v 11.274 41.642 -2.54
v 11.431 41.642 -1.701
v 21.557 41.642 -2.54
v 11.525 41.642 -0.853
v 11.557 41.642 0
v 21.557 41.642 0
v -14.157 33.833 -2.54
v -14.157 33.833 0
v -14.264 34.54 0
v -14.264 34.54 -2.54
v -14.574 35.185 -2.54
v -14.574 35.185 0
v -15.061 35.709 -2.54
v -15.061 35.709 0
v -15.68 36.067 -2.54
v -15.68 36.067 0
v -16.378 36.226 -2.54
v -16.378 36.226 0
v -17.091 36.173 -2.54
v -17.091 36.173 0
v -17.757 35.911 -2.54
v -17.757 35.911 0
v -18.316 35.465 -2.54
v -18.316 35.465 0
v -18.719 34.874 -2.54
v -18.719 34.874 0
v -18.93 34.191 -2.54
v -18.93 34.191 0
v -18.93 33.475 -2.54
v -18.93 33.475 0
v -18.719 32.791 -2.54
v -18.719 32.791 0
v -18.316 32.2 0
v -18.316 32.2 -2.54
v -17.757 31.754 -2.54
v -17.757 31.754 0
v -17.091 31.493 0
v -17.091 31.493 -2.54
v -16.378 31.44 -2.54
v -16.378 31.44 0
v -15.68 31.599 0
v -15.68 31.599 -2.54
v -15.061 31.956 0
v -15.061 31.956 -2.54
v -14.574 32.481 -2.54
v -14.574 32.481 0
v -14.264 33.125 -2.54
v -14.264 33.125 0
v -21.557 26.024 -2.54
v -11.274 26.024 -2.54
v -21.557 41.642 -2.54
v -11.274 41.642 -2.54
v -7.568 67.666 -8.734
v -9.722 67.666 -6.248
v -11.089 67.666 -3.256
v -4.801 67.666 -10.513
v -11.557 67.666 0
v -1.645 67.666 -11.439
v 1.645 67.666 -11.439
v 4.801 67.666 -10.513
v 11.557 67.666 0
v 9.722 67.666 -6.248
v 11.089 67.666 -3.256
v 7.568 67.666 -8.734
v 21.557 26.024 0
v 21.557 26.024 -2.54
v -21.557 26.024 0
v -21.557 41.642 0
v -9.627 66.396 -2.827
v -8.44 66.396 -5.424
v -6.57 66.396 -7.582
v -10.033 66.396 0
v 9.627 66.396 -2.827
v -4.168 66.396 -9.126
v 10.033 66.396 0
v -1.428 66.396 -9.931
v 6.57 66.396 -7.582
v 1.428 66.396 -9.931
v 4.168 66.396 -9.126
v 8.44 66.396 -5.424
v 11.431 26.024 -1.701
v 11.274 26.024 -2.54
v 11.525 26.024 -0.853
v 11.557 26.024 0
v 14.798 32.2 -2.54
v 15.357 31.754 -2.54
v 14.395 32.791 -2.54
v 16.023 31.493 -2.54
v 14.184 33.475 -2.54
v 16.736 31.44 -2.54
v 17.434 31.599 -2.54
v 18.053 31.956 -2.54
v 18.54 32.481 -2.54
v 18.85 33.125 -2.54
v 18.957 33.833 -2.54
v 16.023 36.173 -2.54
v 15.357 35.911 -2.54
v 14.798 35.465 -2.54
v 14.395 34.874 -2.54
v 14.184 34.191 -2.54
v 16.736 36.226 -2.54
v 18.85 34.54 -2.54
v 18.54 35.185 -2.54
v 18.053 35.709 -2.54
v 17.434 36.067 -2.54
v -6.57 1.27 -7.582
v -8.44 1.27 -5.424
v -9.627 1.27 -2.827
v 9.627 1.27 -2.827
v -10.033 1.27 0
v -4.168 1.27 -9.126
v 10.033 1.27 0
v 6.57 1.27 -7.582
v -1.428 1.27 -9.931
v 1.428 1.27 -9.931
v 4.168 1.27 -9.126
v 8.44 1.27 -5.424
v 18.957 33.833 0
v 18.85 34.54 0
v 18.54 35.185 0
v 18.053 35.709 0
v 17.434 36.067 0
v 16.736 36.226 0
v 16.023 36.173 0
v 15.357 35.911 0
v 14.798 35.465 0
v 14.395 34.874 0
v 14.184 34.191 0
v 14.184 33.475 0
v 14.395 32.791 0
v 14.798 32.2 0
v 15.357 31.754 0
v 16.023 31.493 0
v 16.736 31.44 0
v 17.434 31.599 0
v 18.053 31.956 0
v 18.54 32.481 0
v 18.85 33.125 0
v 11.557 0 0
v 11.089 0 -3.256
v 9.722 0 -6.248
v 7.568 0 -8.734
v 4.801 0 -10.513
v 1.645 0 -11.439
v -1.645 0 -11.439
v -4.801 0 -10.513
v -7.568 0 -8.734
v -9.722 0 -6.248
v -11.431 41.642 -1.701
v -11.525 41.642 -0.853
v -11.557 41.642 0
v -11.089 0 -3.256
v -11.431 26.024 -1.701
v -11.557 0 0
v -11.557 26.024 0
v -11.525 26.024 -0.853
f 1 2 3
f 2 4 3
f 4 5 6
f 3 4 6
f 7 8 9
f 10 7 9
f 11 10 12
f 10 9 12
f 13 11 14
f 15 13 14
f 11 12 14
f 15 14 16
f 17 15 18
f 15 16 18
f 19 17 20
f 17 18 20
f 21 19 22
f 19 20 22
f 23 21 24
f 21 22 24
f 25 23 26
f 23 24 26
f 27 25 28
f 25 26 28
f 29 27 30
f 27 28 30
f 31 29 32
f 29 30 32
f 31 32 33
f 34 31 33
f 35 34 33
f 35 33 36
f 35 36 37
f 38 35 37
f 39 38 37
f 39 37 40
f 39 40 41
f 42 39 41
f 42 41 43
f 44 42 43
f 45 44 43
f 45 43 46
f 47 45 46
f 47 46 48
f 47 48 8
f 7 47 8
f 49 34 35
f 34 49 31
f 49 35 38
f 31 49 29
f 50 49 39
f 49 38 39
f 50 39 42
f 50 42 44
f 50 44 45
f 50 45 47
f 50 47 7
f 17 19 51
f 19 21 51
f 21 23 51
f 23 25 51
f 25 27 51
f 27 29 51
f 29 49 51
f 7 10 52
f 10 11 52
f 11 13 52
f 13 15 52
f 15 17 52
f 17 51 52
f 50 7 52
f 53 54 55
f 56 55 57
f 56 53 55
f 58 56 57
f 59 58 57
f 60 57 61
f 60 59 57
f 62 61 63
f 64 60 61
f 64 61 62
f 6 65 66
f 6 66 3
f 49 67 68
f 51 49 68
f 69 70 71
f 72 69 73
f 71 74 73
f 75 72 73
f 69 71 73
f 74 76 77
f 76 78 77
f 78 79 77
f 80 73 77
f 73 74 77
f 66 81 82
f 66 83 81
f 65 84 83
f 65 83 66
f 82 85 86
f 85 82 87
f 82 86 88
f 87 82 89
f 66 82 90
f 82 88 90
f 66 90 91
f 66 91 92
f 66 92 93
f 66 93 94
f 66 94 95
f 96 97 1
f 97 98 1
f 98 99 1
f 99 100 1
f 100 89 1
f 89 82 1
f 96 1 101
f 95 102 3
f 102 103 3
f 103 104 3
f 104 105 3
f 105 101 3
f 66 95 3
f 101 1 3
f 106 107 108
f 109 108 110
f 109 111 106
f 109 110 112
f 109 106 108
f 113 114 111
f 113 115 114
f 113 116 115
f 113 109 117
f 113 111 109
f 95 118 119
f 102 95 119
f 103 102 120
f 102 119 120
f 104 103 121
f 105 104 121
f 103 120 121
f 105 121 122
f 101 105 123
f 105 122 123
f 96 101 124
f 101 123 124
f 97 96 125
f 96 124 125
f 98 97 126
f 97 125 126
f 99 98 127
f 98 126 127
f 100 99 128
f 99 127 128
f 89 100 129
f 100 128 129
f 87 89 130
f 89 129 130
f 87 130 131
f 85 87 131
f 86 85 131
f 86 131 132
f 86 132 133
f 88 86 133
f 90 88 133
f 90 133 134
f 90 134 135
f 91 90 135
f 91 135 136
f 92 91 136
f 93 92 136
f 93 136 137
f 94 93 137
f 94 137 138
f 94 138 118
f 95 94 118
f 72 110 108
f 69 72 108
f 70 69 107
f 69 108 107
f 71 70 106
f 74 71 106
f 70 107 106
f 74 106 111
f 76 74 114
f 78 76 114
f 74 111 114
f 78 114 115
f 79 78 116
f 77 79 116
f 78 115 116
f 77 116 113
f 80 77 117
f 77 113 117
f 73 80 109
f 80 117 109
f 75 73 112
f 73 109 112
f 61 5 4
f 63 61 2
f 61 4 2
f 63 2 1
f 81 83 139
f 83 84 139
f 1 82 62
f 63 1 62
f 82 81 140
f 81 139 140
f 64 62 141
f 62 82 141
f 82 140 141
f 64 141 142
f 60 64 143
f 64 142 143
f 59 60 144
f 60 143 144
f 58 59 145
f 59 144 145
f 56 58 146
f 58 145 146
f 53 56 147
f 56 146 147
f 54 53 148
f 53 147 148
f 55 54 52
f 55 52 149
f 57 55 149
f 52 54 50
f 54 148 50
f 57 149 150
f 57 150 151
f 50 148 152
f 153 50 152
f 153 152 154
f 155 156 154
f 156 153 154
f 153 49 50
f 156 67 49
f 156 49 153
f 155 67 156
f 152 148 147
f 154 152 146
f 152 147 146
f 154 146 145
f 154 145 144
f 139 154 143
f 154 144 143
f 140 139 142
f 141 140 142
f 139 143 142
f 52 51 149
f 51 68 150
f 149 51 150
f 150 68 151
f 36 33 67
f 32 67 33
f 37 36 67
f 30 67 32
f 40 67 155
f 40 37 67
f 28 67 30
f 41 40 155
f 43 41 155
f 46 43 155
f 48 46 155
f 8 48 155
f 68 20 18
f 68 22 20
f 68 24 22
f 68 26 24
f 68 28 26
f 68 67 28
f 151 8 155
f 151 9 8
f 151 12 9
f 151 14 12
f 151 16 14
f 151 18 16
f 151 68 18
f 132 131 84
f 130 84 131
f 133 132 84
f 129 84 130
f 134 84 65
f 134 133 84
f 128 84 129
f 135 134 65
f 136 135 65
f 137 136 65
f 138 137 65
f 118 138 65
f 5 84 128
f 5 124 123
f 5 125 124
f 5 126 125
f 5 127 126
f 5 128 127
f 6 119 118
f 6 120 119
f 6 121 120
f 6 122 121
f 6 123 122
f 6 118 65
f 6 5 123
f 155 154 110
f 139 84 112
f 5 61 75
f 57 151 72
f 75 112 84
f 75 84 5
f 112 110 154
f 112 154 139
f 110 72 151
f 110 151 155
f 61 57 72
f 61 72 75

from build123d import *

# Parameters (mm, degrees)
BOSS_EXTRUDE1_DEPTH  = 66.3956
BOSS_EXTRUDE2_DEPTH  = 1.27
SKETCH6_W            = 10
SKETCH6_H            = 15.618122384
SKETCH6_R            = 0.592132867
SKETCH6_W_2          = 1.524
BOSS_EXTRUDE4_DEPTH  = 2.54
M4_CLEARANCE_HOLE1_D = 4.8


with BuildPart() as part:
    # Sketch1 → Boss-Extrude1 (new body)
    with BuildSketch(Plane(origin=(0, 0, 0), x_dir=(1, 0, 0), z_dir=(0, 1, 0))):
        with BuildLine():
            Line((-11.557, 0), (-10.033, 0))
            ThreePointArc((-10.033, 0), (0, 10.033), (10.033, 0))
            Line((10.033, 0), (11.557, 0))
            ThreePointArc((11.557, 0), (0, 11.557), (-11.557, 0))
        make_face()
    extrude(amount=BOSS_EXTRUDE1_DEPTH)

    # Sketch2 → Boss-Extrude2 (add)
    with BuildSketch(Plane(origin=(0, 66.3956, 0), x_dir=(1, 0, 0), z_dir=(0, 1, 0))):
        with BuildLine():
            Line((-11.557, 0), (11.557, 0))
            ThreePointArc((11.557, 0), (0, 11.557), (-11.557, 0))
        make_face()
    boss_extrude2 = extrude(amount=BOSS_EXTRUDE2_DEPTH)

    # Mirror1: Boss-Extrude2 across plane
    add(boss_extrude2.mirror(Plane.ZX.offset(33.8328)))

    # Sketch6 → Boss-Extrude4 (add)
    # profile 1 of 4: a face of its own
    with BuildSketch(Plane.XY):
        with Locations((-16.557, 33.8328)):
            Rectangle(SKETCH6_W, SKETCH6_H)
        with Locations((-16.557, 33.8328)):
            Circle(SKETCH6_R, mode=Mode.SUBTRACT)
    # profile 2 of 4: a face of its own
    with BuildSketch(Plane.XY):
        with Locations((-10.795, 33.8328)):
            Rectangle(SKETCH6_W_2, SKETCH6_H)
    # profile 3 of 4: a face of its own
    with BuildSketch(Plane.XY):
        with Locations((10.795, 33.8328)):
            Rectangle(SKETCH6_W_2, SKETCH6_H)
    # profile 4 of 4: a face of its own
    with BuildSketch(Plane.XY):
        with Locations((16.557, 33.8328)):
            Rectangle(SKETCH6_W, SKETCH6_H)
        with Locations((16.557, 33.8328)):
            Circle(SKETCH6_R, mode=Mode.SUBTRACT)
    extrude(amount=-BOSS_EXTRUDE4_DEPTH)

    # M4 Clearance Hole1 (through all)
    with Locations(Plane(origin=(0, 0, -2.54), x_dir=(-1, 0, 0), z_dir=(0, 0, -1))):
        with Locations((-16.557, 33.8328), (16.557, 33.8328)):
            Hole(M4_CLEARANCE_HOLE1_D / 2)


solid = part.part
